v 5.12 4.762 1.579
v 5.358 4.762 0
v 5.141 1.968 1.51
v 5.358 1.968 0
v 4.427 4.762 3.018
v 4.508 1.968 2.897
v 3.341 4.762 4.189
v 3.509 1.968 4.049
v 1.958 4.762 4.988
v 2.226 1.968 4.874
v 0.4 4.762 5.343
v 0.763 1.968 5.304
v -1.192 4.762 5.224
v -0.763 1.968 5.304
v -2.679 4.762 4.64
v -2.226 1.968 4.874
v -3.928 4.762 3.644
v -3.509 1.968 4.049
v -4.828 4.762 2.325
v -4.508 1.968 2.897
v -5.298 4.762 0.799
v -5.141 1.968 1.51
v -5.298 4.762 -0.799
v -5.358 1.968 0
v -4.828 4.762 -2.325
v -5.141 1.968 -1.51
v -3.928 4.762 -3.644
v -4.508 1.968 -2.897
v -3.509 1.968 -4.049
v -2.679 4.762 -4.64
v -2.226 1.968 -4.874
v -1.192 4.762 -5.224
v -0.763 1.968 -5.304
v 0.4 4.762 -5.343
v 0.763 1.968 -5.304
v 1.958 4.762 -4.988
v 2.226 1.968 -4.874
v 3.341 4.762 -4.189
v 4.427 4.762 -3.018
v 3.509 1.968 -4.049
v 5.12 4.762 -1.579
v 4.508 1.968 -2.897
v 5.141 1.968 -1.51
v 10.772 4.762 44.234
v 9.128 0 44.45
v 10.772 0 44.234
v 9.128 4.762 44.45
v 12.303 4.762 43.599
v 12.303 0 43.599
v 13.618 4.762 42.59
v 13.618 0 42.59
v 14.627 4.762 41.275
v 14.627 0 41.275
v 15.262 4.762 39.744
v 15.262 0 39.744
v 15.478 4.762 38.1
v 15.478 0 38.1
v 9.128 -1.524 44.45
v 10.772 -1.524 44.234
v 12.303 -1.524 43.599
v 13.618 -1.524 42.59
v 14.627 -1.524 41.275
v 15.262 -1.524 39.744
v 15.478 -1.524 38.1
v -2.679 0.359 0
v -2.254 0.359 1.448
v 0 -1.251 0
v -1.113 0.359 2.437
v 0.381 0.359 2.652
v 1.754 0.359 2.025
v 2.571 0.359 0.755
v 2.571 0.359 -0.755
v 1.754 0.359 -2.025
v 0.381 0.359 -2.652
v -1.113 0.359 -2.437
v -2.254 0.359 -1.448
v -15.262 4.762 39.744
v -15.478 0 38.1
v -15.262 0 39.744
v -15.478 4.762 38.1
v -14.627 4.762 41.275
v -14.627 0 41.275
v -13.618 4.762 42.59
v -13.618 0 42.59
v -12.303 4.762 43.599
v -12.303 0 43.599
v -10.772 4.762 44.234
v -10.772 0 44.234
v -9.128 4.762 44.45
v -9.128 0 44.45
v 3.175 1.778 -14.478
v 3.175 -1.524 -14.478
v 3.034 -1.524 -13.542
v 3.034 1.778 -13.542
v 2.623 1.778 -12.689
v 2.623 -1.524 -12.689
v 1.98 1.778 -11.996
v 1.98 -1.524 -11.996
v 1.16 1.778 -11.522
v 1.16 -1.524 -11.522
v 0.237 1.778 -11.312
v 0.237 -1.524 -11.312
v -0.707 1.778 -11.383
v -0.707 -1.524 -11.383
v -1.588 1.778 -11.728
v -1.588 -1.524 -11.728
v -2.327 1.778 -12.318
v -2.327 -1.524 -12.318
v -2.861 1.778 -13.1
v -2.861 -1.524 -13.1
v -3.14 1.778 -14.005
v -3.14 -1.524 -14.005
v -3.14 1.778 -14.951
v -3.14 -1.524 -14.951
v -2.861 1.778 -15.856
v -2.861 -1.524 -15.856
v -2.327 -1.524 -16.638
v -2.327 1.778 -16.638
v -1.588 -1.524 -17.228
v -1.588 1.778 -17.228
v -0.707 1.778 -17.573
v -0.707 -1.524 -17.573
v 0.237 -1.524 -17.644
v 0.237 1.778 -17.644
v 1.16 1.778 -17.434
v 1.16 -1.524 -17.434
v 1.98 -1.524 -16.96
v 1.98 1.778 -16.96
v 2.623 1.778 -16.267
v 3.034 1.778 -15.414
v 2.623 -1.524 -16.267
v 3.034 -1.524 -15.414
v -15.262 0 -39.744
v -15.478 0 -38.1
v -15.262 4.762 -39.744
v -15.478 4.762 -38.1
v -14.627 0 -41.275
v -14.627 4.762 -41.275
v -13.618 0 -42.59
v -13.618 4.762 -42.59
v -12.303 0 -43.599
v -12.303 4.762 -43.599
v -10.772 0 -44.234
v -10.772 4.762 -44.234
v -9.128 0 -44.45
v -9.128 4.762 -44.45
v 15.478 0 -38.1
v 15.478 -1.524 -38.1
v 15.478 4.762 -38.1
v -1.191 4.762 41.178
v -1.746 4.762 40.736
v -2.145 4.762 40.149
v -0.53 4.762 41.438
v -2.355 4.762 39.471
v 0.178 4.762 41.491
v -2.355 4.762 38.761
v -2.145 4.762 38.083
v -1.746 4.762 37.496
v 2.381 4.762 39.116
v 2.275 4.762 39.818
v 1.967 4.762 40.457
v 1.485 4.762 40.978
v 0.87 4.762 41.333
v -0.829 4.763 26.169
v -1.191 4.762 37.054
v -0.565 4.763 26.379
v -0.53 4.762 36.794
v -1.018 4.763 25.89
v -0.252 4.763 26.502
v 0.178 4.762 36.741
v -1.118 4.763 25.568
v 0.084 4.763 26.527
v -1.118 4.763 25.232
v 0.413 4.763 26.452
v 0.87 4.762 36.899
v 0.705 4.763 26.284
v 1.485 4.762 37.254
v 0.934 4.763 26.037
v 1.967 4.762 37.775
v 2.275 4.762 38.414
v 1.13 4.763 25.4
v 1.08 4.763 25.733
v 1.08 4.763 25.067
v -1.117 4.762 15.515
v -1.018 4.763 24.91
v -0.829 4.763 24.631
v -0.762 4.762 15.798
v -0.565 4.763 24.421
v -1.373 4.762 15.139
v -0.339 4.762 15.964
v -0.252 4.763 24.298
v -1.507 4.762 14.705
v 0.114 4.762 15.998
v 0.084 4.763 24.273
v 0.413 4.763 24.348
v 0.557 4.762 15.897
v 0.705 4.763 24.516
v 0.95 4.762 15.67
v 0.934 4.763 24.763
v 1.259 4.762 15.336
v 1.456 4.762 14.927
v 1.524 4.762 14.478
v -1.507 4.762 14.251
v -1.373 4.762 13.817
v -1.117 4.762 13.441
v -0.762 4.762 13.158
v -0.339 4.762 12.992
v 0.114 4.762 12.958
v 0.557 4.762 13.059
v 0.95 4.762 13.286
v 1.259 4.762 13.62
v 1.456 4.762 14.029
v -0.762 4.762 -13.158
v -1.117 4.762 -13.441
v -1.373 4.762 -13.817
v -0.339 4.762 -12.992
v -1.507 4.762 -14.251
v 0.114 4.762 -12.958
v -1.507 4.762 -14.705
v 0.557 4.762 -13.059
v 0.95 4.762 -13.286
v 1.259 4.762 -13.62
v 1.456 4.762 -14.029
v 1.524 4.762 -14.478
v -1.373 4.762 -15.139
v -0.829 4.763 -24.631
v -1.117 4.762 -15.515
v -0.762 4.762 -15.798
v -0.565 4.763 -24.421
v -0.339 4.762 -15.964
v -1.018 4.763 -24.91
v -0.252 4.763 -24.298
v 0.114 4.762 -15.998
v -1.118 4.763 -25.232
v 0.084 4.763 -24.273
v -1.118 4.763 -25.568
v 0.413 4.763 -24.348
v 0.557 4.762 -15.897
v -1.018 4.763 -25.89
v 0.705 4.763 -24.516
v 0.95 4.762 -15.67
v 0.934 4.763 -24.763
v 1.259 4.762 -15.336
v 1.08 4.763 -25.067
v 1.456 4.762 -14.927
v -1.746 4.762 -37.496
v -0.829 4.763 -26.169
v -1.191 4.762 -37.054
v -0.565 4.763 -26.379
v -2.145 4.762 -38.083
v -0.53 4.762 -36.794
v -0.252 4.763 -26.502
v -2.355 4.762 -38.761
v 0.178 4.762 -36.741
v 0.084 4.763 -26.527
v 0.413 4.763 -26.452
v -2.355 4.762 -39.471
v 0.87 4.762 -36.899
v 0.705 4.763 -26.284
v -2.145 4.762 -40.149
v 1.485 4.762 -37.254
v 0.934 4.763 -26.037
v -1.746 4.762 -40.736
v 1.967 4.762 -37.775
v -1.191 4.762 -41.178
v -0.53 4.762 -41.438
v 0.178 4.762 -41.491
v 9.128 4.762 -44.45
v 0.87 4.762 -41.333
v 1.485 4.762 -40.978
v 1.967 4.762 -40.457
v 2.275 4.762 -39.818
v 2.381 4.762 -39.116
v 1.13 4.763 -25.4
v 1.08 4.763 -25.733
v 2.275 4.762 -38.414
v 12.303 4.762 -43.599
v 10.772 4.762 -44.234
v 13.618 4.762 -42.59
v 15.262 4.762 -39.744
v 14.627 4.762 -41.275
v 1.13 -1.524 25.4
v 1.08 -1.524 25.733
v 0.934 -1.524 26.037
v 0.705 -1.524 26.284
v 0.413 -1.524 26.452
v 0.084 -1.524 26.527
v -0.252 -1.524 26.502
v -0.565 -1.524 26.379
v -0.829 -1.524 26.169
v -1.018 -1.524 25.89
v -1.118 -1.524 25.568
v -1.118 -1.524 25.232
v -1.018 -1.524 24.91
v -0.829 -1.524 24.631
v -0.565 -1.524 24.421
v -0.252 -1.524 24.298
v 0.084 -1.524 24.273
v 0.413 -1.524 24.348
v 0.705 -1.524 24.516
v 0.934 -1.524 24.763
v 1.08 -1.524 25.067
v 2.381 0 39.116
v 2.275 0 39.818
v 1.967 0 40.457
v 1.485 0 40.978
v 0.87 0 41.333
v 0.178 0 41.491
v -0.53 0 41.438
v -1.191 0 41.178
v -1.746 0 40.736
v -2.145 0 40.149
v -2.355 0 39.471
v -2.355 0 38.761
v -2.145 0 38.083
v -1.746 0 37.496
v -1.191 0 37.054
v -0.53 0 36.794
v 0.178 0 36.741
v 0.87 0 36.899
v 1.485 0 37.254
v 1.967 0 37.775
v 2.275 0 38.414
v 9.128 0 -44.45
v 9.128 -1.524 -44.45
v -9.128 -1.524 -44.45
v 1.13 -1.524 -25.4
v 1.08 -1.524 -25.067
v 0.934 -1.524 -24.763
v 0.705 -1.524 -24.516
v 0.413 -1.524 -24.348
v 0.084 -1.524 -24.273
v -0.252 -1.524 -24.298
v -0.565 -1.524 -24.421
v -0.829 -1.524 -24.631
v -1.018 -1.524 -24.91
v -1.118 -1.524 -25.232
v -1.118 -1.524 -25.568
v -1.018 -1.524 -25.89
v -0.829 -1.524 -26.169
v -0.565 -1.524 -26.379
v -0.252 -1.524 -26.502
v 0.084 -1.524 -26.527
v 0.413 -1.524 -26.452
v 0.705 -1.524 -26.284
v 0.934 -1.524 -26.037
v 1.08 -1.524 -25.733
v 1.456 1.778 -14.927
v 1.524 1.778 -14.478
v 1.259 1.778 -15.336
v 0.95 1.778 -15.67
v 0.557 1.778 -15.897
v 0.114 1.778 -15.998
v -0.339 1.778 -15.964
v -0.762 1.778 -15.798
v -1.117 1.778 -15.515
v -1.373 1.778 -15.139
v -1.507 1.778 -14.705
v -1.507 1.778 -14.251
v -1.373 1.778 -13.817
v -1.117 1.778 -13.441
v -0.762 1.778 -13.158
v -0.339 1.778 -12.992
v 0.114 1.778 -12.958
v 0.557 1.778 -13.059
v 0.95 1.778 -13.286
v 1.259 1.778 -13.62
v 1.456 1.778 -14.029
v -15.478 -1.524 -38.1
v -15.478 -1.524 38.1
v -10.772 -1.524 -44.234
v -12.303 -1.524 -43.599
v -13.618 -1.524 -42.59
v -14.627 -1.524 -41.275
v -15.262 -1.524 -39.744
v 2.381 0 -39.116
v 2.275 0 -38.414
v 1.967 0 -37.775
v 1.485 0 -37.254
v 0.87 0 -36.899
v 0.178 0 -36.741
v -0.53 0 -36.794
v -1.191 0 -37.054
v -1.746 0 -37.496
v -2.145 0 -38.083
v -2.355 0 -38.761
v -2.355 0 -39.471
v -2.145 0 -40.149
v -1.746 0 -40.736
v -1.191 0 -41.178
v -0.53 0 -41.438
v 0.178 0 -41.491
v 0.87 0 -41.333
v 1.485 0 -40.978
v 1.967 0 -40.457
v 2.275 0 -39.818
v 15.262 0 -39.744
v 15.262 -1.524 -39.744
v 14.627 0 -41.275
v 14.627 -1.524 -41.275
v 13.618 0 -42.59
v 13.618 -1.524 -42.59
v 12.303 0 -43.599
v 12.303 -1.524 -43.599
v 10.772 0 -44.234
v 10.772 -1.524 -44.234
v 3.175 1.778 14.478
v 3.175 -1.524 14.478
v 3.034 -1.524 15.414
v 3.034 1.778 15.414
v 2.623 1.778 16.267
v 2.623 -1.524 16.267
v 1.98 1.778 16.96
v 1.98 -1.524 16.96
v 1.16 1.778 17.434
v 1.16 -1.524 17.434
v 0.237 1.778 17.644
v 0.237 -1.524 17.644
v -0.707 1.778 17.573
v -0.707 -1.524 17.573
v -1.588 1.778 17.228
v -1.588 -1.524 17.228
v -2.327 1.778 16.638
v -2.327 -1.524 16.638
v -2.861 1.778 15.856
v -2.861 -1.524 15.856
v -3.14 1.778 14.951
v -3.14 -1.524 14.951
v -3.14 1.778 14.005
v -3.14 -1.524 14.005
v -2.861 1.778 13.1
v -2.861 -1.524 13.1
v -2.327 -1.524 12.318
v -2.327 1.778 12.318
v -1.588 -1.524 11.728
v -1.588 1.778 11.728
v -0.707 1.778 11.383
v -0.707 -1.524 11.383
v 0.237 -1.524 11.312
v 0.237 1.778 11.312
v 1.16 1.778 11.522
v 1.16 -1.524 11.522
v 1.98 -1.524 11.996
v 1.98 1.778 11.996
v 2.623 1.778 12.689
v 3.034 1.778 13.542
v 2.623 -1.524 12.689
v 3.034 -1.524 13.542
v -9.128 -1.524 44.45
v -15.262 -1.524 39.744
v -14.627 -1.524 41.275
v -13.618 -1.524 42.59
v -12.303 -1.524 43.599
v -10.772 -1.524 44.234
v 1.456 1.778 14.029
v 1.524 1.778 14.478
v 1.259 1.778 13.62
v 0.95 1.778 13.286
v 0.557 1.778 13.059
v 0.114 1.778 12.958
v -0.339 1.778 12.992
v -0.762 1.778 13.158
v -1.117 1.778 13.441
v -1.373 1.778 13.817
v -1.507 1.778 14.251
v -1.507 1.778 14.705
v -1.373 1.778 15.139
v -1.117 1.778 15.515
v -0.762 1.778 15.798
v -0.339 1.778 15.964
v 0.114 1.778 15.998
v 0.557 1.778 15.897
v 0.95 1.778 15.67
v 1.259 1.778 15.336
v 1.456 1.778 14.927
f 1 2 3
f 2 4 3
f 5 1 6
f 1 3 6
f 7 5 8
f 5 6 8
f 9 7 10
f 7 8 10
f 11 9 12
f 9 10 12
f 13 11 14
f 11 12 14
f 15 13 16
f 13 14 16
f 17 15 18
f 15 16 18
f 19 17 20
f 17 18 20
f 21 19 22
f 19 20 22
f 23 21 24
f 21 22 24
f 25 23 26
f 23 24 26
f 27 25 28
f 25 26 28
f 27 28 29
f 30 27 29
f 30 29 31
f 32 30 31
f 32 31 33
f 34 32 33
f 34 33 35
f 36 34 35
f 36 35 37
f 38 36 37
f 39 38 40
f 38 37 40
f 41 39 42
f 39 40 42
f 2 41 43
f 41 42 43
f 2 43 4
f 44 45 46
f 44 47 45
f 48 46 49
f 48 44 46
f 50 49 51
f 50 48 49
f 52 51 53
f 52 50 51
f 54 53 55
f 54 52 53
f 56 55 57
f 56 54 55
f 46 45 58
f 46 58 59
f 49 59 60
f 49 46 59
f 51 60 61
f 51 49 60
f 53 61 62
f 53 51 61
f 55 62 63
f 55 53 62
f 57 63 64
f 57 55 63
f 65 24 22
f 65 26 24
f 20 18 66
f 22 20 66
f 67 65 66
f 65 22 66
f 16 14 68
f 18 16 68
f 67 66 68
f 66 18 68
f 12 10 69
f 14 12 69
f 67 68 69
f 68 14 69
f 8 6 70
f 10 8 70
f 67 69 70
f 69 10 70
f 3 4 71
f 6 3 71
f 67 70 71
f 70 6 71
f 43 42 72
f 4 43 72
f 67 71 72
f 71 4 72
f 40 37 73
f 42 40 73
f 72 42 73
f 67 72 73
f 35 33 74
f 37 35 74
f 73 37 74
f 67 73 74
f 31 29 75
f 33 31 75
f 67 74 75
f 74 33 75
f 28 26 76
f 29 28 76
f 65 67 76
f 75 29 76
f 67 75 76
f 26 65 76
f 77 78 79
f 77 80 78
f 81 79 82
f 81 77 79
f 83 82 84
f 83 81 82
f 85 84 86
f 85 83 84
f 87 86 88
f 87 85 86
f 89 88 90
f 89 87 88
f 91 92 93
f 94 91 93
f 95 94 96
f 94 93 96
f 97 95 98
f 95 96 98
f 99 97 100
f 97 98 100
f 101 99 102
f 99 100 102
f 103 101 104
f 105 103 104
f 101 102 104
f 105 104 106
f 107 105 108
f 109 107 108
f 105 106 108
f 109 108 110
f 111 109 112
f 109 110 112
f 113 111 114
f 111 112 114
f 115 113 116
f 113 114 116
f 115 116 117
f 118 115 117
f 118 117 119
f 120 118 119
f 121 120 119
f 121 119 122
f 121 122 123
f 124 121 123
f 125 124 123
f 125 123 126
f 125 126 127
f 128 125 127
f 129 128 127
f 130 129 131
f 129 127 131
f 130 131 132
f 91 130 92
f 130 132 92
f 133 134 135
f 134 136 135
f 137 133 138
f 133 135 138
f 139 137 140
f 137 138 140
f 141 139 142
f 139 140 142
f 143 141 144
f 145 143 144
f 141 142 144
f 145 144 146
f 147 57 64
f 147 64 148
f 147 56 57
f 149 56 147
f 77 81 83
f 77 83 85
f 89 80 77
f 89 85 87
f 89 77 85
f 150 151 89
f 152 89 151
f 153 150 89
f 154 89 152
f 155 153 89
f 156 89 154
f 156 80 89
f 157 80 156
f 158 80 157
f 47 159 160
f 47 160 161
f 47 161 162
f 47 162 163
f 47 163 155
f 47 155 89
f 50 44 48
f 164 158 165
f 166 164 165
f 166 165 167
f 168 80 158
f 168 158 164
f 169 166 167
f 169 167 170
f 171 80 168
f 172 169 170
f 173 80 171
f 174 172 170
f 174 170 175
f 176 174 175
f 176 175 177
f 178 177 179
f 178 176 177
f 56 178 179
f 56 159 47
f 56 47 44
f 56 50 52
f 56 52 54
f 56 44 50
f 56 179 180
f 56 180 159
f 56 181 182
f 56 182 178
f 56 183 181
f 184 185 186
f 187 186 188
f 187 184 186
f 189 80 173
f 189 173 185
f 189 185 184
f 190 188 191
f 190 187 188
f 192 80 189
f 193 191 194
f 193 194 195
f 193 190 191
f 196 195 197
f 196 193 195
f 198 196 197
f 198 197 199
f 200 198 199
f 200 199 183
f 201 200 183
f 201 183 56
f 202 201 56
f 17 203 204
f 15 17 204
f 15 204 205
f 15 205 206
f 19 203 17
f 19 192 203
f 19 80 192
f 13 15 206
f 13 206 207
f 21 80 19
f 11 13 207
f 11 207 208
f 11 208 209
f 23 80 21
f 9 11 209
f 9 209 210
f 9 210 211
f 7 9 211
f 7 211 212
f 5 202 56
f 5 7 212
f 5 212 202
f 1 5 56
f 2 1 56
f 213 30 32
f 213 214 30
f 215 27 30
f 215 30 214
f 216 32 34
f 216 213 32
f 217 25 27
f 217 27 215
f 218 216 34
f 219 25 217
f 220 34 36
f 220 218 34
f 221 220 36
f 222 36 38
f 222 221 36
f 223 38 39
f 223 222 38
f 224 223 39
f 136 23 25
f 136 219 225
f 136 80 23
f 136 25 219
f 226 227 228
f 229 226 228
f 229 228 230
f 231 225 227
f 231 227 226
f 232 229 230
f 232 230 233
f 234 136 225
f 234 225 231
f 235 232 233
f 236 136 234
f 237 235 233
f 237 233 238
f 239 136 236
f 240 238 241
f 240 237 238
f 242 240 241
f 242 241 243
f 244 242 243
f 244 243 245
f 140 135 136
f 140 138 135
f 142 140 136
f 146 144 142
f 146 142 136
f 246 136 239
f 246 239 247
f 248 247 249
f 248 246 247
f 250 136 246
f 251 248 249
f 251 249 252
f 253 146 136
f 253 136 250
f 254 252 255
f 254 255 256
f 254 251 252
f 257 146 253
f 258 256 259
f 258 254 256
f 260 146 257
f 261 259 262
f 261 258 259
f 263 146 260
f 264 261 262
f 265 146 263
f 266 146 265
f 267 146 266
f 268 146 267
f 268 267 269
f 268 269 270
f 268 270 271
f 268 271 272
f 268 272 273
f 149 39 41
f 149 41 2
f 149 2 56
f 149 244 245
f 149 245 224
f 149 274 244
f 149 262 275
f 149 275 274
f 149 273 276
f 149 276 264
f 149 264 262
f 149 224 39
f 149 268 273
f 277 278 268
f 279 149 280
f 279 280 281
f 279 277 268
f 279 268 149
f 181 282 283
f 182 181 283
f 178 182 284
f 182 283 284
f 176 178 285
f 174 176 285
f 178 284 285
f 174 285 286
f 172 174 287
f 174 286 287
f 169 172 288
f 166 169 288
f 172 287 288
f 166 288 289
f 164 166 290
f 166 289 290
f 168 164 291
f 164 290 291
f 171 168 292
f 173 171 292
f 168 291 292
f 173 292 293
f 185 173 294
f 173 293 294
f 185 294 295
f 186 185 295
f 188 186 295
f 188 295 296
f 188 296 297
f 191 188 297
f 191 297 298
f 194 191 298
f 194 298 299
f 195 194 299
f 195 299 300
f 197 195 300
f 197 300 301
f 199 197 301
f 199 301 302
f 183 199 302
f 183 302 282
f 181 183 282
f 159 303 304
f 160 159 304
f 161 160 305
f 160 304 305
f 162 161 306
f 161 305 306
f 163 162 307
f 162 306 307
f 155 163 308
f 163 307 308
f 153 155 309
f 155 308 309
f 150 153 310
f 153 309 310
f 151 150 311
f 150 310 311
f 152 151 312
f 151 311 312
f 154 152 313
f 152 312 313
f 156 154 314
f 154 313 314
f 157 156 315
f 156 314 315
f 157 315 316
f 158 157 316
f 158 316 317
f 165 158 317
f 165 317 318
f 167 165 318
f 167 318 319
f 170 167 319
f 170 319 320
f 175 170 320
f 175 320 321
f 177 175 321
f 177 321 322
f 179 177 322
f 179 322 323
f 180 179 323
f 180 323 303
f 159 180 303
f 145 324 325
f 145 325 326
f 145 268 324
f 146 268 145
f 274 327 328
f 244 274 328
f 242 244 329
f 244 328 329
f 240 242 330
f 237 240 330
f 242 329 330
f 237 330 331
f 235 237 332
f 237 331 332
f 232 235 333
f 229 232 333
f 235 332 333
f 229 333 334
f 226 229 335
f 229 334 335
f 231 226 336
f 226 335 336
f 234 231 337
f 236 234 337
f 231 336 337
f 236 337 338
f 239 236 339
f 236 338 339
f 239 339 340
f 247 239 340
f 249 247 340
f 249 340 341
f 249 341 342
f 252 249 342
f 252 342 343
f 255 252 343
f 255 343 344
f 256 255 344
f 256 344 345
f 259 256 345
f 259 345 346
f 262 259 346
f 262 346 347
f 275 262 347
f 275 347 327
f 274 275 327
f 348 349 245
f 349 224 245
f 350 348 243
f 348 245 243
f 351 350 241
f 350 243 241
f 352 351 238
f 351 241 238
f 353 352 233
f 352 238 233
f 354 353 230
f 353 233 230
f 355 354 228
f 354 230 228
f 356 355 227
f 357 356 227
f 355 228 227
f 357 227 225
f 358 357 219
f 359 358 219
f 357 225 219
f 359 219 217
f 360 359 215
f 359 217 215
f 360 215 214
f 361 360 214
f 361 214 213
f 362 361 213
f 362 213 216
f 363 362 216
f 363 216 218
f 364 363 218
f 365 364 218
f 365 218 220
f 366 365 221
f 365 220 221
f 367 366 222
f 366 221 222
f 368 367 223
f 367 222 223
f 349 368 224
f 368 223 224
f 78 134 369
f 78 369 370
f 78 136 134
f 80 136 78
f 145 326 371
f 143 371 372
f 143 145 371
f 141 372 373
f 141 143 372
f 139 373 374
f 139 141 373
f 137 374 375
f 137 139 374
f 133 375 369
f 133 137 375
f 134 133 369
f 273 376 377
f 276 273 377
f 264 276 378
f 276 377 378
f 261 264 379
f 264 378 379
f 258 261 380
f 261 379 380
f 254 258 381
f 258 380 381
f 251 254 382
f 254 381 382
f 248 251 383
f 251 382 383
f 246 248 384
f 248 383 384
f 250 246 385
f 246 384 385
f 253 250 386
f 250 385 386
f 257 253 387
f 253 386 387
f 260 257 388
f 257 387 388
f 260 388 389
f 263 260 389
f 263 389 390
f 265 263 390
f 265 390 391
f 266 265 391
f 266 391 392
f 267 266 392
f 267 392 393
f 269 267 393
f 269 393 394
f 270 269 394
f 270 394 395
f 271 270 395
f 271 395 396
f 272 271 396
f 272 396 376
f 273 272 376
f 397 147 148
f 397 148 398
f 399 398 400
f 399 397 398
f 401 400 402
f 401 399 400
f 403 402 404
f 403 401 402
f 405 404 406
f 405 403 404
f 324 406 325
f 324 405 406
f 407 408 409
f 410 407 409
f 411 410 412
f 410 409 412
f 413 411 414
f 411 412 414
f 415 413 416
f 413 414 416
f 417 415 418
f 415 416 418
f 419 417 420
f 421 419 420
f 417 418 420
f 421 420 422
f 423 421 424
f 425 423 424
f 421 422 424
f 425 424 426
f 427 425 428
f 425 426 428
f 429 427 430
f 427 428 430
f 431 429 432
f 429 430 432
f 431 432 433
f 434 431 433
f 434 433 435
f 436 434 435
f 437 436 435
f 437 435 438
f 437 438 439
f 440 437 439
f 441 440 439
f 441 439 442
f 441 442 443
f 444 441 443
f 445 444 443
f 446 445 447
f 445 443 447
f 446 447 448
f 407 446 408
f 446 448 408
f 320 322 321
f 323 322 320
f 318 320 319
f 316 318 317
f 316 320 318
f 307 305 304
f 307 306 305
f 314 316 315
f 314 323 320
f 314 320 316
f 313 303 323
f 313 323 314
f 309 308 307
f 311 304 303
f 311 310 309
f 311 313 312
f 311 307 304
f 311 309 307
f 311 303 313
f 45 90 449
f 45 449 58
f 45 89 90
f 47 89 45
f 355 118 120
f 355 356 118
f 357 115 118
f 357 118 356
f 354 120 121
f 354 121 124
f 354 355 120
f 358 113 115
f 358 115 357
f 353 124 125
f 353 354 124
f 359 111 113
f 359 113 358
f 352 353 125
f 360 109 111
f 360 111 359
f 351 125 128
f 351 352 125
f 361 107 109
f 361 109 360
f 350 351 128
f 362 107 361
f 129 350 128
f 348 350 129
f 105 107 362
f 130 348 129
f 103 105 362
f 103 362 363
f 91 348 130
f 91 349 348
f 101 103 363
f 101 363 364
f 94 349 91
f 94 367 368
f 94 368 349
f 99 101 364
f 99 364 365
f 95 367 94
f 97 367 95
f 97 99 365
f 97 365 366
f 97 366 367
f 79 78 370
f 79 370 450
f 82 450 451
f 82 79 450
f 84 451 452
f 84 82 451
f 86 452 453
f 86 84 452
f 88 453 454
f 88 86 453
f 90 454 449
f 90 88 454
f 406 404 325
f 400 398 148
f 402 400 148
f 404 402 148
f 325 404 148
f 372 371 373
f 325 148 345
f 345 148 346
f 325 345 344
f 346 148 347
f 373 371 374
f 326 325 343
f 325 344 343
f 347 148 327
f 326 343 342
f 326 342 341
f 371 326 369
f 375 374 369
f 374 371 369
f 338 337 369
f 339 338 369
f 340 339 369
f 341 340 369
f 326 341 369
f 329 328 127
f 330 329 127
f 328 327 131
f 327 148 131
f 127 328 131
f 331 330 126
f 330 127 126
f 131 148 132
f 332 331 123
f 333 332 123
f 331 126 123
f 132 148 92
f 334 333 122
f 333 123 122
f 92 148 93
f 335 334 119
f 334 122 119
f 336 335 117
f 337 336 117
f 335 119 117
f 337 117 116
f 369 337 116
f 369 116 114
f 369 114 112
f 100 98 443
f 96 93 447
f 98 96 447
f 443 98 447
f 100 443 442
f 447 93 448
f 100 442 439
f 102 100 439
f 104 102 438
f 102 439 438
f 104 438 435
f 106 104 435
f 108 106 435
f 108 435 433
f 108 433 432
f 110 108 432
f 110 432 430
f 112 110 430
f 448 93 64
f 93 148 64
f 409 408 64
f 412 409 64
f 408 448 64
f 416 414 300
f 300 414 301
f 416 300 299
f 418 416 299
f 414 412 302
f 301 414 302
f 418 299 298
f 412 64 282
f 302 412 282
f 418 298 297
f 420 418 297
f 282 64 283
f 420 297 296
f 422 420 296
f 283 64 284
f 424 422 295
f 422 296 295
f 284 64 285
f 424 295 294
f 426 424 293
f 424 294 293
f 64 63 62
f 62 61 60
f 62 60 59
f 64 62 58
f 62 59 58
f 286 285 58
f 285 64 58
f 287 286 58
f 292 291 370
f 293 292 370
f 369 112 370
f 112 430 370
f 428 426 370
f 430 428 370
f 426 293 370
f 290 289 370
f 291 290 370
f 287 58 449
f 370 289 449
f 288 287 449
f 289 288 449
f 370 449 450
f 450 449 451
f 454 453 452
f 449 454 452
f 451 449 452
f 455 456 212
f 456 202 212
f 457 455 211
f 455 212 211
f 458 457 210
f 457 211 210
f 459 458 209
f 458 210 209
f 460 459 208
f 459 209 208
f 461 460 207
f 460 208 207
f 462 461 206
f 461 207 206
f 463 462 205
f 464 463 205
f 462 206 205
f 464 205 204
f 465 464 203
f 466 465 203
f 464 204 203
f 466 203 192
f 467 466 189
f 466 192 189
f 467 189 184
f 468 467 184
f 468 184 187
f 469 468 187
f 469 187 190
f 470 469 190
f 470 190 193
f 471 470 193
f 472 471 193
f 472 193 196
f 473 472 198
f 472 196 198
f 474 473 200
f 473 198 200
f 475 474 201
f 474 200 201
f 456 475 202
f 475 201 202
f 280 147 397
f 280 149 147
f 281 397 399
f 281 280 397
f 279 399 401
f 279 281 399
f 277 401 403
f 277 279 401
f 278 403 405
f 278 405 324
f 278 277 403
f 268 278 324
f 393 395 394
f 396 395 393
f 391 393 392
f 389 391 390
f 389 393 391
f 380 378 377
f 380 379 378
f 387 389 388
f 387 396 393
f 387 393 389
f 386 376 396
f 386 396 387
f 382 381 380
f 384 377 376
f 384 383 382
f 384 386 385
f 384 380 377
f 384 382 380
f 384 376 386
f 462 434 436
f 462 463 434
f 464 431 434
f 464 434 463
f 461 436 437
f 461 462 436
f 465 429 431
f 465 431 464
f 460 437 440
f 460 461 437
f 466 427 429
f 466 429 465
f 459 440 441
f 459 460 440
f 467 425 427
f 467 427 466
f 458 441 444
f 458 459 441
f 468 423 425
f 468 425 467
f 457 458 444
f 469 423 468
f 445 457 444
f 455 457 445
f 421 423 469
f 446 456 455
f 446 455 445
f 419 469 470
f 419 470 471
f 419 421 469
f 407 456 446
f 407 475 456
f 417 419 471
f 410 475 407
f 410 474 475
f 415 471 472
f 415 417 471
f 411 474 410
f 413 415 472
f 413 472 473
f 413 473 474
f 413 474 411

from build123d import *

# Parameters (mm, degrees)
SKETCH1_W                   = 30.95625
SKETCH1_H                   = 88.9
BOSS_EXTRUDE1_DEPTH         = 4.7625
FILLET1_R                   = 6.35
SKETCH6_R                   = 1.524
CUT_EXTRUDE1_DEPTH          = 5.7625
SKETCH7_R                   = 2.38125
CUT_EXTRUDE2_DEPTH          = 5.7625
BOSS_EXTRUDE3_DEPTH         = 1.524
F_4_40_TAPPED_HOLE1_D       = 2.2606
SKETCH10_R                  = 1.524
CUT_EXTRUDE3_DEPTH          = 2.524
SKETCH11_R                  = 3.175
CUT_EXTRUDE4_DEPTH          = 3.302
F_1_2_13_TAPPED_HOLE2_D     = 10.71626
F_1_2_13_TAPPED_HOLE2_DEPTH = 2.794
F_1_2_13_TAPPED_HOLE2_TIP   = 3.219489309


with BuildPart() as part:
    # Sketch1 → Boss-Extrude1 (new body)
    with BuildSketch(Plane(origin=(0, 0, 0), x_dir=(1, 0, 0), z_dir=(0, 1, 0))):
        Rectangle(SKETCH1_W, SKETCH1_H)
    extrude(amount=BOSS_EXTRUDE1_DEPTH)

    # Fillet1
    fillet1_edges = [part.edges().sort_by_distance(p)[0] for p in [
        (15.478125, 2.38125, -44.45),
        (15.478125, 2.38125, 44.45),
        (-15.478125, 2.38125, 44.45),
        (-15.478125, 2.38125, -44.45),
    ]]
    fillet(fillet1_edges, radius=FILLET1_R)

    # Sketch6 → Cut-Extrude1 (cut, through all)
    with BuildSketch(Plane.XZ):
        with Locations((0, 14.478)):
            Circle(SKETCH6_R)
        with Locations((0, -14.478)):
            Circle(SKETCH6_R)
    extrude(amount=-CUT_EXTRUDE1_DEPTH, mode=Mode.SUBTRACT)

    # Sketch7 → Cut-Extrude2 (cut, through all)
    with BuildSketch(Plane.XZ):
        with Locations((0, -39.116)):
            Circle(SKETCH7_R)
        with Locations((0, 39.116)):
            Circle(SKETCH7_R)
    extrude(amount=-CUT_EXTRUDE2_DEPTH, mode=Mode.SUBTRACT)

    # Sketch9 → Boss-Extrude3 (add)
    with BuildSketch(Plane.XZ):
        with BuildLine():
            Line((9.128125, -44.45), (-9.128125, -44.45))
            ThreePointArc((-9.128125, -44.45), (-13.618253061, -42.590128061), (-15.478125, -38.1))
            Line((-15.478125, -38.1), (-15.478125, 38.1))
            ThreePointArc((-15.478125, 38.1), (-13.618253061, 42.590128061), (-9.128125, 44.45))
            Line((-9.128125, 44.45), (9.128125, 44.45))
            ThreePointArc((9.128125, 44.45), (13.618253061, 42.590128061), (15.478125, 38.1))
            Line((15.478125, 38.1), (15.478125, -38.1))
            ThreePointArc((15.478125, -38.1), (13.618253061, -42.590128061), (9.128125, -44.45))
        make_face()
    extrude(amount=BOSS_EXTRUDE3_DEPTH)

    # #4-40 Tapped Hole1 (through all)
    with Locations(Plane(origin=(0, 4.7625, 0), x_dir=(-1, 0, 0), z_dir=(0, 1, 0))):
        with Locations((0, 25.4), (0, -25.4)):
            Hole(F_4_40_TAPPED_HOLE1_D / 2)

    # Sketch10 → Cut-Extrude3 (cut, through all)
    with BuildSketch(Plane(origin=(0, 0, 0), x_dir=(1, 0, 0), z_dir=(0, 1, 0))):
        with Locations((0, -14.478)):
            Circle(SKETCH10_R)
        with Locations((0, 14.478)):
            Circle(SKETCH10_R)
    extrude(amount=-CUT_EXTRUDE3_DEPTH, mode=Mode.SUBTRACT)

    # Sketch11 → Cut-Extrude4 (cut)
    with BuildSketch(Plane.XZ.offset(1.524)):
        with Locations((0, -14.478)):
            Circle(SKETCH11_R)
        with Locations((0, 14.478)):
            Circle(SKETCH11_R)
    extrude(amount=-CUT_EXTRUDE4_DEPTH, mode=Mode.SUBTRACT)

    # 1/2-13 Tapped Hole2
    with Locations(Plane(origin=(0, 4.7625, 0), x_dir=(-1, 0, 0), z_dir=(0, 1, 0))):
        with Locations((0, 0)):
            Hole(F_1_2_13_TAPPED_HOLE2_D / 2, depth=F_1_2_13_TAPPED_HOLE2_DEPTH)
            with Locations((0, 0, -(F_1_2_13_TAPPED_HOLE2_DEPTH + F_1_2_13_TAPPED_HOLE2_TIP / 2))):  # 118° drill point
                Cone(0, F_1_2_13_TAPPED_HOLE2_D / 2, F_1_2_13_TAPPED_HOLE2_TIP, mode=Mode.SUBTRACT)


solid = part.part
